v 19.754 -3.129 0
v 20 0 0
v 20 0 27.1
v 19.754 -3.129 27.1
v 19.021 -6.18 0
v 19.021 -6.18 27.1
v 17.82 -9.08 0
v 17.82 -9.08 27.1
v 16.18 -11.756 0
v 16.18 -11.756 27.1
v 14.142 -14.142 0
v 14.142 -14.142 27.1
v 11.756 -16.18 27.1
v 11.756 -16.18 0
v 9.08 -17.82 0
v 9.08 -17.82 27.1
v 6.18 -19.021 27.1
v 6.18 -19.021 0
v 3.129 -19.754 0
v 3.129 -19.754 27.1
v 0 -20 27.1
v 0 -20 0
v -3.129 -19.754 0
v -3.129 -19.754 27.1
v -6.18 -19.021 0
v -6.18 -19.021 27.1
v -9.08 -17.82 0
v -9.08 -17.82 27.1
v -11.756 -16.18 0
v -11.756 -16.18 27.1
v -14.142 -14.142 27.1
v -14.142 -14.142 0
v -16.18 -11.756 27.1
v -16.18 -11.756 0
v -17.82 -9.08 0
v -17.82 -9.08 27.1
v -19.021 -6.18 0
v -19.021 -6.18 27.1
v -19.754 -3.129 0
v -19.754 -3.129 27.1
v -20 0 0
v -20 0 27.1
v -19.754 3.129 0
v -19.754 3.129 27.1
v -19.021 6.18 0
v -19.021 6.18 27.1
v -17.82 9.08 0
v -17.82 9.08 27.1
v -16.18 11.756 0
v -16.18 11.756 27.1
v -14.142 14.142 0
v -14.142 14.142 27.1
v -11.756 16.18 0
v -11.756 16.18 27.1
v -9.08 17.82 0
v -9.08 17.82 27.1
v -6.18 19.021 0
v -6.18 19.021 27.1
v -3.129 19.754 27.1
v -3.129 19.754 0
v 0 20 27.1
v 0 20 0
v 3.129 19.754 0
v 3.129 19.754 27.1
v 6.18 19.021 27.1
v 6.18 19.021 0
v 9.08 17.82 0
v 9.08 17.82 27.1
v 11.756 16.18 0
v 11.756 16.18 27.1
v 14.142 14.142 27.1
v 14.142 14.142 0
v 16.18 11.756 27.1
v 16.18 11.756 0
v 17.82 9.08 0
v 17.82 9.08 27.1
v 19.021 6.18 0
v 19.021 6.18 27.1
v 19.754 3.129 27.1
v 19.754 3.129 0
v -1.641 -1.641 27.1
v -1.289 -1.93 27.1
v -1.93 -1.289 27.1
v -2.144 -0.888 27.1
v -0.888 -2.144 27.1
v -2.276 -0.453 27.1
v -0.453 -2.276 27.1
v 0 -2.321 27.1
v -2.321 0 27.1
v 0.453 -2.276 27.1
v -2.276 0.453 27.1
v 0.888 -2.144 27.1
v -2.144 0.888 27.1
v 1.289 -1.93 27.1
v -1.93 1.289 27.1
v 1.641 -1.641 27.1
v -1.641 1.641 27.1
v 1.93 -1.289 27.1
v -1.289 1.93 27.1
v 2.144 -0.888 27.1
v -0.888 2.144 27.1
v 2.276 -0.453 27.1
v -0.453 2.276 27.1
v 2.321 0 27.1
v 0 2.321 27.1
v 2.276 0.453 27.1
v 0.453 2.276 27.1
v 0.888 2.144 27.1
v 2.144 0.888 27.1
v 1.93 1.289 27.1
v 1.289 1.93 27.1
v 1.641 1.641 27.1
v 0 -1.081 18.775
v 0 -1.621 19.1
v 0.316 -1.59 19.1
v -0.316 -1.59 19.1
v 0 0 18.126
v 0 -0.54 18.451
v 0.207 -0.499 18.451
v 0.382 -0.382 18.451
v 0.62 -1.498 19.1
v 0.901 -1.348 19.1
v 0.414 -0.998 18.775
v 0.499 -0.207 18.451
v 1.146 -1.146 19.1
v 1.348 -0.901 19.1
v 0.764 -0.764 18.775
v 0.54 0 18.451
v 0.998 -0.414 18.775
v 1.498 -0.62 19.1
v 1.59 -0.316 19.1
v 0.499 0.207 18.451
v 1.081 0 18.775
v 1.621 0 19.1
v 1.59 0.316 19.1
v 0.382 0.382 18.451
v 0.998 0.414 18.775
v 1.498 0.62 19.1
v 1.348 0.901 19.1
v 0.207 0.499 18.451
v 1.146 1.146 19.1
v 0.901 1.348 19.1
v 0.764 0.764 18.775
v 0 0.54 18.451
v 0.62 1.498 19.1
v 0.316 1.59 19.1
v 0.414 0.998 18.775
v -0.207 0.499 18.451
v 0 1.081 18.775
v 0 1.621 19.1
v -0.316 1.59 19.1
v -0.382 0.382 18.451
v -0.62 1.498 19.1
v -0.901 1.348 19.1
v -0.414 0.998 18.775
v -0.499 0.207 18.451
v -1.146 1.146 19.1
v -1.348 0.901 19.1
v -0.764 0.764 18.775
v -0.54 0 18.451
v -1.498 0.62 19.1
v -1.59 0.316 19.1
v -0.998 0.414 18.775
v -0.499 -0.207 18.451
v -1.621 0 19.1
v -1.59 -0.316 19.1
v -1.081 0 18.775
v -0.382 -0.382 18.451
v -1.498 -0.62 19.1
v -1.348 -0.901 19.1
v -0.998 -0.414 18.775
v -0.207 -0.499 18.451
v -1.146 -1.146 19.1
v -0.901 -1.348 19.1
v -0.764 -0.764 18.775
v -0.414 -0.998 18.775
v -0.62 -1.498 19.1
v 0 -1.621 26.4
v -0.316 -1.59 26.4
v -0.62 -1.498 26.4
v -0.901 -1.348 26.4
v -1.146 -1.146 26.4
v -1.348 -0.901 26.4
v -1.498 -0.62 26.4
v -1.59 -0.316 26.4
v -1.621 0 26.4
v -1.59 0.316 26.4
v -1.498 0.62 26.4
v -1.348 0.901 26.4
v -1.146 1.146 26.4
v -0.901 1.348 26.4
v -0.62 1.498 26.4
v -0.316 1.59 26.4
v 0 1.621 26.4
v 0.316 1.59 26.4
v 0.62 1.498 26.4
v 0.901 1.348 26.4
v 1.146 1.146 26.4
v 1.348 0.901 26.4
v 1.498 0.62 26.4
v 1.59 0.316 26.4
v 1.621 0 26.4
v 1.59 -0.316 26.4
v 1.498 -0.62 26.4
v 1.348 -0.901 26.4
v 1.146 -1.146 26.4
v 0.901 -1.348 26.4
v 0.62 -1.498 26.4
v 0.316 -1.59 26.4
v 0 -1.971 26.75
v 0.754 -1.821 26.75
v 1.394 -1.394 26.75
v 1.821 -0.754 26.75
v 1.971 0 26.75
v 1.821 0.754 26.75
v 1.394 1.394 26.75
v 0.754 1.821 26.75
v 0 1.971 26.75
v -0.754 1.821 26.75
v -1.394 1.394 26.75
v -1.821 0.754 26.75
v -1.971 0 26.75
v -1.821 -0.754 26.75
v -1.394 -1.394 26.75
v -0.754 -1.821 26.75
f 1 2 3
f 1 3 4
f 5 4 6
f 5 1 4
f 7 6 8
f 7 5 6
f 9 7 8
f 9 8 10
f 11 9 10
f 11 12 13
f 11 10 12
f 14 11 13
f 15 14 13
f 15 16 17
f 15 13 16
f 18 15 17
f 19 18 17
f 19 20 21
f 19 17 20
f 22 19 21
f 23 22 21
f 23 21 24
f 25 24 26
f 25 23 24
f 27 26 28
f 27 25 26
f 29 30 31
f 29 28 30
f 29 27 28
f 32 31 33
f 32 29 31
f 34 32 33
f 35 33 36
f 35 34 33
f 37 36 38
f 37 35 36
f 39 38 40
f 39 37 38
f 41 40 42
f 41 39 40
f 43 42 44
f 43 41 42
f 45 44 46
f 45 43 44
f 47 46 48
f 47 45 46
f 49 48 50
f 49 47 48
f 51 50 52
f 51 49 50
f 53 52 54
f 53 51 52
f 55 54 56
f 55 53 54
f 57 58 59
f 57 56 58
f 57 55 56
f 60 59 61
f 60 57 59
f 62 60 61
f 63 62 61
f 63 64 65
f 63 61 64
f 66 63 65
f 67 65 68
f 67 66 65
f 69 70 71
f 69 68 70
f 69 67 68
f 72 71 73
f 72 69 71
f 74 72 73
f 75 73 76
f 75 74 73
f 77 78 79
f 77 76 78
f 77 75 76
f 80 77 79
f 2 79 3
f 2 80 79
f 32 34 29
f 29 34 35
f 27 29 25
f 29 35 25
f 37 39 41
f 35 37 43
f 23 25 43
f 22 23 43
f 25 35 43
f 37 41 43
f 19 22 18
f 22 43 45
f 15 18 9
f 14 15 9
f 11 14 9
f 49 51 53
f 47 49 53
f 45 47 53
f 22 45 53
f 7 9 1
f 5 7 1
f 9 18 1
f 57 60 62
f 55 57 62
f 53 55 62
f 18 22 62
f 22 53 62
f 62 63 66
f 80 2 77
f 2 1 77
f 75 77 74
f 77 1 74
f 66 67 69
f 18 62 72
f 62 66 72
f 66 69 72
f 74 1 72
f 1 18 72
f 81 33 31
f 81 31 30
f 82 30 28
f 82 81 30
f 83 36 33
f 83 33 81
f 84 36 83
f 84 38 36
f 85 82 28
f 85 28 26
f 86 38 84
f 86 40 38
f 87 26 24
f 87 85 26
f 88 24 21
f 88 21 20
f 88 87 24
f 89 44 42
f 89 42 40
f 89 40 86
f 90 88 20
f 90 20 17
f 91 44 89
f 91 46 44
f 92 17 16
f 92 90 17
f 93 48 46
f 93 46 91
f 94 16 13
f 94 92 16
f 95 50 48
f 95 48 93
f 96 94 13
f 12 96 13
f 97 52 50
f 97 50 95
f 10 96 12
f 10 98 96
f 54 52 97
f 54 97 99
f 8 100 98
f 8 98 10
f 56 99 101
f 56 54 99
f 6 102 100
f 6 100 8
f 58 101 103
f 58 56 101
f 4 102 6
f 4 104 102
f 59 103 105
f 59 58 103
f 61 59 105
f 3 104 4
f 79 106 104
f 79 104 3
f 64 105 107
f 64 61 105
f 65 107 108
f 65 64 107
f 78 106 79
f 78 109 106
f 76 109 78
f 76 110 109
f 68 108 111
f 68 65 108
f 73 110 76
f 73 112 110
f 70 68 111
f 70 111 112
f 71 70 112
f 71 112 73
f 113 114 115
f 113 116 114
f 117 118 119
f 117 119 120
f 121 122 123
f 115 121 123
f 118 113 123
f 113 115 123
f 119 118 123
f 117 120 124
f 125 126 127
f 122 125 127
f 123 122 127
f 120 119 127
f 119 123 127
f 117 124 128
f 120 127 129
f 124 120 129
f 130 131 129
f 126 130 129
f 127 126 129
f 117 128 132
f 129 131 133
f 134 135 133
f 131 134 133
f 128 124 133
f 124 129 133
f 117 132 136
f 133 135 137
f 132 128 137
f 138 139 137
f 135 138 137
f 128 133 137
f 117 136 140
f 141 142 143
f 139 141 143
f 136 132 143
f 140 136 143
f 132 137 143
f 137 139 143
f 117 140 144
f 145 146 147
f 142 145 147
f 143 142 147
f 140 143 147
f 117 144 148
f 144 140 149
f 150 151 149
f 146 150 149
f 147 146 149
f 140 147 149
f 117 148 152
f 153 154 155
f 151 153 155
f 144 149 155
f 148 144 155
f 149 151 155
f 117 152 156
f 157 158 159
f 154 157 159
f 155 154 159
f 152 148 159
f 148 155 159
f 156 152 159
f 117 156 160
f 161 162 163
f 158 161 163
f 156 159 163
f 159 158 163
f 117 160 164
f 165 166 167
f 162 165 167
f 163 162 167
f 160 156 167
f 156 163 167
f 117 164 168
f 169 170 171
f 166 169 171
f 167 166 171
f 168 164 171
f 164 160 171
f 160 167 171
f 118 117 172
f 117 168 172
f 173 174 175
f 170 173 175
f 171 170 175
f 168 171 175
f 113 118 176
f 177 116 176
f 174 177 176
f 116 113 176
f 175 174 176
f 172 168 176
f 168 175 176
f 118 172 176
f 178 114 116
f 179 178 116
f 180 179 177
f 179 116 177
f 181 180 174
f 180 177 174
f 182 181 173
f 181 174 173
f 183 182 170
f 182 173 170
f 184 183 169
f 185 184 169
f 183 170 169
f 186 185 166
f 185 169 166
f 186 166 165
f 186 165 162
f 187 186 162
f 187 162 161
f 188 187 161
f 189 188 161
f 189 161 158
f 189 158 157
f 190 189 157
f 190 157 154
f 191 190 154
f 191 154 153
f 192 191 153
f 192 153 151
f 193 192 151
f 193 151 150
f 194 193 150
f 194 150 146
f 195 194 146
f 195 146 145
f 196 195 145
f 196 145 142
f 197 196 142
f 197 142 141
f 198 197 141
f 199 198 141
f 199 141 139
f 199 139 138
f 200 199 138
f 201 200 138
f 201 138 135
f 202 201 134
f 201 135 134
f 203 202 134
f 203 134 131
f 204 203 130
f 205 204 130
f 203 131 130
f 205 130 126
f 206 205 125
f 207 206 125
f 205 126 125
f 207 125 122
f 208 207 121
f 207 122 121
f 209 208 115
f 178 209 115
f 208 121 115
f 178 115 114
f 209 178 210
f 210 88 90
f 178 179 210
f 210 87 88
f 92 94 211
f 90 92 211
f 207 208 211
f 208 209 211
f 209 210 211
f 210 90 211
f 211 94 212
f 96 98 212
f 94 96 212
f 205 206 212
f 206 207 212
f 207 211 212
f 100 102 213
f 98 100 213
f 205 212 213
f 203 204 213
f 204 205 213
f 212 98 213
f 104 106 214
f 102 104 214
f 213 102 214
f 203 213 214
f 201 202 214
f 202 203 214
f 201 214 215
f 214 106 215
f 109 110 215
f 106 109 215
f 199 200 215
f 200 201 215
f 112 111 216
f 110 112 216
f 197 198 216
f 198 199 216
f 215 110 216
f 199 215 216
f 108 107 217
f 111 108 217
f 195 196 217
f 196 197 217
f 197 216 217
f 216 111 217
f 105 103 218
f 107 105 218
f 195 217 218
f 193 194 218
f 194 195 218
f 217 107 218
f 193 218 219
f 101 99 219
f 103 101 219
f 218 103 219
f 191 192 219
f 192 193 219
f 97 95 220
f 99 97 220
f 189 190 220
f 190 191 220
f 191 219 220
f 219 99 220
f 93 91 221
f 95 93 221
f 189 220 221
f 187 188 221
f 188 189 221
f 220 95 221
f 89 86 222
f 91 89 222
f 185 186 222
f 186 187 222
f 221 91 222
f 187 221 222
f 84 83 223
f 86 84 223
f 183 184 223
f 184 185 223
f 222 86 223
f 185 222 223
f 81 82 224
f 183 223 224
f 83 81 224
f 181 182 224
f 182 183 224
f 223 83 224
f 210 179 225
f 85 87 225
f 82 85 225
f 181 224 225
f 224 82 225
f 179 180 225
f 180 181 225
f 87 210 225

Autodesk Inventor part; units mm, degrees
ref_plane "YZ Plane" through (0, 0, 0) normal (1, 0, 0) x (0, 1, 0)
ref_plane "XZ Plane" through (0, 0, 0) normal (0, 1, 0) x (-1, 0, 0)
ref_plane "XY Plane" through (0, 0, 0) normal (0, 0, 1) x (1, 0, 0)
sketch "Sketch1" plane through (0, 0, 0) normal (0, 0, 1) x (1, 0, 0)
  circle A0 centre (0, 0) radius 20
  dimension "d0" = 40
extrude "Extrusion1" add sketch "Sketch1" along normal blind 27.1
sketch "Sketch2" plane through (0, 0, 27.1) normal (0, 0, 1) x (1, 0, 0)
  point P0 (0, 0)
  point P1 (0, 0)
hole "Hole1" at (0, 0, 27.1) direction (0, 0, -1) diameter 3.242 depth 8 tip angle 118 thread size "M4x0.7" class "6H" standard "ISO Metric profile"
chamfer "Chamfer1" distance 0.7 angle 45 1 edges at (0, 1.621, 27.1)
properties part number "CounterWeights_Brass" material "Brass, Soft Yellow"
